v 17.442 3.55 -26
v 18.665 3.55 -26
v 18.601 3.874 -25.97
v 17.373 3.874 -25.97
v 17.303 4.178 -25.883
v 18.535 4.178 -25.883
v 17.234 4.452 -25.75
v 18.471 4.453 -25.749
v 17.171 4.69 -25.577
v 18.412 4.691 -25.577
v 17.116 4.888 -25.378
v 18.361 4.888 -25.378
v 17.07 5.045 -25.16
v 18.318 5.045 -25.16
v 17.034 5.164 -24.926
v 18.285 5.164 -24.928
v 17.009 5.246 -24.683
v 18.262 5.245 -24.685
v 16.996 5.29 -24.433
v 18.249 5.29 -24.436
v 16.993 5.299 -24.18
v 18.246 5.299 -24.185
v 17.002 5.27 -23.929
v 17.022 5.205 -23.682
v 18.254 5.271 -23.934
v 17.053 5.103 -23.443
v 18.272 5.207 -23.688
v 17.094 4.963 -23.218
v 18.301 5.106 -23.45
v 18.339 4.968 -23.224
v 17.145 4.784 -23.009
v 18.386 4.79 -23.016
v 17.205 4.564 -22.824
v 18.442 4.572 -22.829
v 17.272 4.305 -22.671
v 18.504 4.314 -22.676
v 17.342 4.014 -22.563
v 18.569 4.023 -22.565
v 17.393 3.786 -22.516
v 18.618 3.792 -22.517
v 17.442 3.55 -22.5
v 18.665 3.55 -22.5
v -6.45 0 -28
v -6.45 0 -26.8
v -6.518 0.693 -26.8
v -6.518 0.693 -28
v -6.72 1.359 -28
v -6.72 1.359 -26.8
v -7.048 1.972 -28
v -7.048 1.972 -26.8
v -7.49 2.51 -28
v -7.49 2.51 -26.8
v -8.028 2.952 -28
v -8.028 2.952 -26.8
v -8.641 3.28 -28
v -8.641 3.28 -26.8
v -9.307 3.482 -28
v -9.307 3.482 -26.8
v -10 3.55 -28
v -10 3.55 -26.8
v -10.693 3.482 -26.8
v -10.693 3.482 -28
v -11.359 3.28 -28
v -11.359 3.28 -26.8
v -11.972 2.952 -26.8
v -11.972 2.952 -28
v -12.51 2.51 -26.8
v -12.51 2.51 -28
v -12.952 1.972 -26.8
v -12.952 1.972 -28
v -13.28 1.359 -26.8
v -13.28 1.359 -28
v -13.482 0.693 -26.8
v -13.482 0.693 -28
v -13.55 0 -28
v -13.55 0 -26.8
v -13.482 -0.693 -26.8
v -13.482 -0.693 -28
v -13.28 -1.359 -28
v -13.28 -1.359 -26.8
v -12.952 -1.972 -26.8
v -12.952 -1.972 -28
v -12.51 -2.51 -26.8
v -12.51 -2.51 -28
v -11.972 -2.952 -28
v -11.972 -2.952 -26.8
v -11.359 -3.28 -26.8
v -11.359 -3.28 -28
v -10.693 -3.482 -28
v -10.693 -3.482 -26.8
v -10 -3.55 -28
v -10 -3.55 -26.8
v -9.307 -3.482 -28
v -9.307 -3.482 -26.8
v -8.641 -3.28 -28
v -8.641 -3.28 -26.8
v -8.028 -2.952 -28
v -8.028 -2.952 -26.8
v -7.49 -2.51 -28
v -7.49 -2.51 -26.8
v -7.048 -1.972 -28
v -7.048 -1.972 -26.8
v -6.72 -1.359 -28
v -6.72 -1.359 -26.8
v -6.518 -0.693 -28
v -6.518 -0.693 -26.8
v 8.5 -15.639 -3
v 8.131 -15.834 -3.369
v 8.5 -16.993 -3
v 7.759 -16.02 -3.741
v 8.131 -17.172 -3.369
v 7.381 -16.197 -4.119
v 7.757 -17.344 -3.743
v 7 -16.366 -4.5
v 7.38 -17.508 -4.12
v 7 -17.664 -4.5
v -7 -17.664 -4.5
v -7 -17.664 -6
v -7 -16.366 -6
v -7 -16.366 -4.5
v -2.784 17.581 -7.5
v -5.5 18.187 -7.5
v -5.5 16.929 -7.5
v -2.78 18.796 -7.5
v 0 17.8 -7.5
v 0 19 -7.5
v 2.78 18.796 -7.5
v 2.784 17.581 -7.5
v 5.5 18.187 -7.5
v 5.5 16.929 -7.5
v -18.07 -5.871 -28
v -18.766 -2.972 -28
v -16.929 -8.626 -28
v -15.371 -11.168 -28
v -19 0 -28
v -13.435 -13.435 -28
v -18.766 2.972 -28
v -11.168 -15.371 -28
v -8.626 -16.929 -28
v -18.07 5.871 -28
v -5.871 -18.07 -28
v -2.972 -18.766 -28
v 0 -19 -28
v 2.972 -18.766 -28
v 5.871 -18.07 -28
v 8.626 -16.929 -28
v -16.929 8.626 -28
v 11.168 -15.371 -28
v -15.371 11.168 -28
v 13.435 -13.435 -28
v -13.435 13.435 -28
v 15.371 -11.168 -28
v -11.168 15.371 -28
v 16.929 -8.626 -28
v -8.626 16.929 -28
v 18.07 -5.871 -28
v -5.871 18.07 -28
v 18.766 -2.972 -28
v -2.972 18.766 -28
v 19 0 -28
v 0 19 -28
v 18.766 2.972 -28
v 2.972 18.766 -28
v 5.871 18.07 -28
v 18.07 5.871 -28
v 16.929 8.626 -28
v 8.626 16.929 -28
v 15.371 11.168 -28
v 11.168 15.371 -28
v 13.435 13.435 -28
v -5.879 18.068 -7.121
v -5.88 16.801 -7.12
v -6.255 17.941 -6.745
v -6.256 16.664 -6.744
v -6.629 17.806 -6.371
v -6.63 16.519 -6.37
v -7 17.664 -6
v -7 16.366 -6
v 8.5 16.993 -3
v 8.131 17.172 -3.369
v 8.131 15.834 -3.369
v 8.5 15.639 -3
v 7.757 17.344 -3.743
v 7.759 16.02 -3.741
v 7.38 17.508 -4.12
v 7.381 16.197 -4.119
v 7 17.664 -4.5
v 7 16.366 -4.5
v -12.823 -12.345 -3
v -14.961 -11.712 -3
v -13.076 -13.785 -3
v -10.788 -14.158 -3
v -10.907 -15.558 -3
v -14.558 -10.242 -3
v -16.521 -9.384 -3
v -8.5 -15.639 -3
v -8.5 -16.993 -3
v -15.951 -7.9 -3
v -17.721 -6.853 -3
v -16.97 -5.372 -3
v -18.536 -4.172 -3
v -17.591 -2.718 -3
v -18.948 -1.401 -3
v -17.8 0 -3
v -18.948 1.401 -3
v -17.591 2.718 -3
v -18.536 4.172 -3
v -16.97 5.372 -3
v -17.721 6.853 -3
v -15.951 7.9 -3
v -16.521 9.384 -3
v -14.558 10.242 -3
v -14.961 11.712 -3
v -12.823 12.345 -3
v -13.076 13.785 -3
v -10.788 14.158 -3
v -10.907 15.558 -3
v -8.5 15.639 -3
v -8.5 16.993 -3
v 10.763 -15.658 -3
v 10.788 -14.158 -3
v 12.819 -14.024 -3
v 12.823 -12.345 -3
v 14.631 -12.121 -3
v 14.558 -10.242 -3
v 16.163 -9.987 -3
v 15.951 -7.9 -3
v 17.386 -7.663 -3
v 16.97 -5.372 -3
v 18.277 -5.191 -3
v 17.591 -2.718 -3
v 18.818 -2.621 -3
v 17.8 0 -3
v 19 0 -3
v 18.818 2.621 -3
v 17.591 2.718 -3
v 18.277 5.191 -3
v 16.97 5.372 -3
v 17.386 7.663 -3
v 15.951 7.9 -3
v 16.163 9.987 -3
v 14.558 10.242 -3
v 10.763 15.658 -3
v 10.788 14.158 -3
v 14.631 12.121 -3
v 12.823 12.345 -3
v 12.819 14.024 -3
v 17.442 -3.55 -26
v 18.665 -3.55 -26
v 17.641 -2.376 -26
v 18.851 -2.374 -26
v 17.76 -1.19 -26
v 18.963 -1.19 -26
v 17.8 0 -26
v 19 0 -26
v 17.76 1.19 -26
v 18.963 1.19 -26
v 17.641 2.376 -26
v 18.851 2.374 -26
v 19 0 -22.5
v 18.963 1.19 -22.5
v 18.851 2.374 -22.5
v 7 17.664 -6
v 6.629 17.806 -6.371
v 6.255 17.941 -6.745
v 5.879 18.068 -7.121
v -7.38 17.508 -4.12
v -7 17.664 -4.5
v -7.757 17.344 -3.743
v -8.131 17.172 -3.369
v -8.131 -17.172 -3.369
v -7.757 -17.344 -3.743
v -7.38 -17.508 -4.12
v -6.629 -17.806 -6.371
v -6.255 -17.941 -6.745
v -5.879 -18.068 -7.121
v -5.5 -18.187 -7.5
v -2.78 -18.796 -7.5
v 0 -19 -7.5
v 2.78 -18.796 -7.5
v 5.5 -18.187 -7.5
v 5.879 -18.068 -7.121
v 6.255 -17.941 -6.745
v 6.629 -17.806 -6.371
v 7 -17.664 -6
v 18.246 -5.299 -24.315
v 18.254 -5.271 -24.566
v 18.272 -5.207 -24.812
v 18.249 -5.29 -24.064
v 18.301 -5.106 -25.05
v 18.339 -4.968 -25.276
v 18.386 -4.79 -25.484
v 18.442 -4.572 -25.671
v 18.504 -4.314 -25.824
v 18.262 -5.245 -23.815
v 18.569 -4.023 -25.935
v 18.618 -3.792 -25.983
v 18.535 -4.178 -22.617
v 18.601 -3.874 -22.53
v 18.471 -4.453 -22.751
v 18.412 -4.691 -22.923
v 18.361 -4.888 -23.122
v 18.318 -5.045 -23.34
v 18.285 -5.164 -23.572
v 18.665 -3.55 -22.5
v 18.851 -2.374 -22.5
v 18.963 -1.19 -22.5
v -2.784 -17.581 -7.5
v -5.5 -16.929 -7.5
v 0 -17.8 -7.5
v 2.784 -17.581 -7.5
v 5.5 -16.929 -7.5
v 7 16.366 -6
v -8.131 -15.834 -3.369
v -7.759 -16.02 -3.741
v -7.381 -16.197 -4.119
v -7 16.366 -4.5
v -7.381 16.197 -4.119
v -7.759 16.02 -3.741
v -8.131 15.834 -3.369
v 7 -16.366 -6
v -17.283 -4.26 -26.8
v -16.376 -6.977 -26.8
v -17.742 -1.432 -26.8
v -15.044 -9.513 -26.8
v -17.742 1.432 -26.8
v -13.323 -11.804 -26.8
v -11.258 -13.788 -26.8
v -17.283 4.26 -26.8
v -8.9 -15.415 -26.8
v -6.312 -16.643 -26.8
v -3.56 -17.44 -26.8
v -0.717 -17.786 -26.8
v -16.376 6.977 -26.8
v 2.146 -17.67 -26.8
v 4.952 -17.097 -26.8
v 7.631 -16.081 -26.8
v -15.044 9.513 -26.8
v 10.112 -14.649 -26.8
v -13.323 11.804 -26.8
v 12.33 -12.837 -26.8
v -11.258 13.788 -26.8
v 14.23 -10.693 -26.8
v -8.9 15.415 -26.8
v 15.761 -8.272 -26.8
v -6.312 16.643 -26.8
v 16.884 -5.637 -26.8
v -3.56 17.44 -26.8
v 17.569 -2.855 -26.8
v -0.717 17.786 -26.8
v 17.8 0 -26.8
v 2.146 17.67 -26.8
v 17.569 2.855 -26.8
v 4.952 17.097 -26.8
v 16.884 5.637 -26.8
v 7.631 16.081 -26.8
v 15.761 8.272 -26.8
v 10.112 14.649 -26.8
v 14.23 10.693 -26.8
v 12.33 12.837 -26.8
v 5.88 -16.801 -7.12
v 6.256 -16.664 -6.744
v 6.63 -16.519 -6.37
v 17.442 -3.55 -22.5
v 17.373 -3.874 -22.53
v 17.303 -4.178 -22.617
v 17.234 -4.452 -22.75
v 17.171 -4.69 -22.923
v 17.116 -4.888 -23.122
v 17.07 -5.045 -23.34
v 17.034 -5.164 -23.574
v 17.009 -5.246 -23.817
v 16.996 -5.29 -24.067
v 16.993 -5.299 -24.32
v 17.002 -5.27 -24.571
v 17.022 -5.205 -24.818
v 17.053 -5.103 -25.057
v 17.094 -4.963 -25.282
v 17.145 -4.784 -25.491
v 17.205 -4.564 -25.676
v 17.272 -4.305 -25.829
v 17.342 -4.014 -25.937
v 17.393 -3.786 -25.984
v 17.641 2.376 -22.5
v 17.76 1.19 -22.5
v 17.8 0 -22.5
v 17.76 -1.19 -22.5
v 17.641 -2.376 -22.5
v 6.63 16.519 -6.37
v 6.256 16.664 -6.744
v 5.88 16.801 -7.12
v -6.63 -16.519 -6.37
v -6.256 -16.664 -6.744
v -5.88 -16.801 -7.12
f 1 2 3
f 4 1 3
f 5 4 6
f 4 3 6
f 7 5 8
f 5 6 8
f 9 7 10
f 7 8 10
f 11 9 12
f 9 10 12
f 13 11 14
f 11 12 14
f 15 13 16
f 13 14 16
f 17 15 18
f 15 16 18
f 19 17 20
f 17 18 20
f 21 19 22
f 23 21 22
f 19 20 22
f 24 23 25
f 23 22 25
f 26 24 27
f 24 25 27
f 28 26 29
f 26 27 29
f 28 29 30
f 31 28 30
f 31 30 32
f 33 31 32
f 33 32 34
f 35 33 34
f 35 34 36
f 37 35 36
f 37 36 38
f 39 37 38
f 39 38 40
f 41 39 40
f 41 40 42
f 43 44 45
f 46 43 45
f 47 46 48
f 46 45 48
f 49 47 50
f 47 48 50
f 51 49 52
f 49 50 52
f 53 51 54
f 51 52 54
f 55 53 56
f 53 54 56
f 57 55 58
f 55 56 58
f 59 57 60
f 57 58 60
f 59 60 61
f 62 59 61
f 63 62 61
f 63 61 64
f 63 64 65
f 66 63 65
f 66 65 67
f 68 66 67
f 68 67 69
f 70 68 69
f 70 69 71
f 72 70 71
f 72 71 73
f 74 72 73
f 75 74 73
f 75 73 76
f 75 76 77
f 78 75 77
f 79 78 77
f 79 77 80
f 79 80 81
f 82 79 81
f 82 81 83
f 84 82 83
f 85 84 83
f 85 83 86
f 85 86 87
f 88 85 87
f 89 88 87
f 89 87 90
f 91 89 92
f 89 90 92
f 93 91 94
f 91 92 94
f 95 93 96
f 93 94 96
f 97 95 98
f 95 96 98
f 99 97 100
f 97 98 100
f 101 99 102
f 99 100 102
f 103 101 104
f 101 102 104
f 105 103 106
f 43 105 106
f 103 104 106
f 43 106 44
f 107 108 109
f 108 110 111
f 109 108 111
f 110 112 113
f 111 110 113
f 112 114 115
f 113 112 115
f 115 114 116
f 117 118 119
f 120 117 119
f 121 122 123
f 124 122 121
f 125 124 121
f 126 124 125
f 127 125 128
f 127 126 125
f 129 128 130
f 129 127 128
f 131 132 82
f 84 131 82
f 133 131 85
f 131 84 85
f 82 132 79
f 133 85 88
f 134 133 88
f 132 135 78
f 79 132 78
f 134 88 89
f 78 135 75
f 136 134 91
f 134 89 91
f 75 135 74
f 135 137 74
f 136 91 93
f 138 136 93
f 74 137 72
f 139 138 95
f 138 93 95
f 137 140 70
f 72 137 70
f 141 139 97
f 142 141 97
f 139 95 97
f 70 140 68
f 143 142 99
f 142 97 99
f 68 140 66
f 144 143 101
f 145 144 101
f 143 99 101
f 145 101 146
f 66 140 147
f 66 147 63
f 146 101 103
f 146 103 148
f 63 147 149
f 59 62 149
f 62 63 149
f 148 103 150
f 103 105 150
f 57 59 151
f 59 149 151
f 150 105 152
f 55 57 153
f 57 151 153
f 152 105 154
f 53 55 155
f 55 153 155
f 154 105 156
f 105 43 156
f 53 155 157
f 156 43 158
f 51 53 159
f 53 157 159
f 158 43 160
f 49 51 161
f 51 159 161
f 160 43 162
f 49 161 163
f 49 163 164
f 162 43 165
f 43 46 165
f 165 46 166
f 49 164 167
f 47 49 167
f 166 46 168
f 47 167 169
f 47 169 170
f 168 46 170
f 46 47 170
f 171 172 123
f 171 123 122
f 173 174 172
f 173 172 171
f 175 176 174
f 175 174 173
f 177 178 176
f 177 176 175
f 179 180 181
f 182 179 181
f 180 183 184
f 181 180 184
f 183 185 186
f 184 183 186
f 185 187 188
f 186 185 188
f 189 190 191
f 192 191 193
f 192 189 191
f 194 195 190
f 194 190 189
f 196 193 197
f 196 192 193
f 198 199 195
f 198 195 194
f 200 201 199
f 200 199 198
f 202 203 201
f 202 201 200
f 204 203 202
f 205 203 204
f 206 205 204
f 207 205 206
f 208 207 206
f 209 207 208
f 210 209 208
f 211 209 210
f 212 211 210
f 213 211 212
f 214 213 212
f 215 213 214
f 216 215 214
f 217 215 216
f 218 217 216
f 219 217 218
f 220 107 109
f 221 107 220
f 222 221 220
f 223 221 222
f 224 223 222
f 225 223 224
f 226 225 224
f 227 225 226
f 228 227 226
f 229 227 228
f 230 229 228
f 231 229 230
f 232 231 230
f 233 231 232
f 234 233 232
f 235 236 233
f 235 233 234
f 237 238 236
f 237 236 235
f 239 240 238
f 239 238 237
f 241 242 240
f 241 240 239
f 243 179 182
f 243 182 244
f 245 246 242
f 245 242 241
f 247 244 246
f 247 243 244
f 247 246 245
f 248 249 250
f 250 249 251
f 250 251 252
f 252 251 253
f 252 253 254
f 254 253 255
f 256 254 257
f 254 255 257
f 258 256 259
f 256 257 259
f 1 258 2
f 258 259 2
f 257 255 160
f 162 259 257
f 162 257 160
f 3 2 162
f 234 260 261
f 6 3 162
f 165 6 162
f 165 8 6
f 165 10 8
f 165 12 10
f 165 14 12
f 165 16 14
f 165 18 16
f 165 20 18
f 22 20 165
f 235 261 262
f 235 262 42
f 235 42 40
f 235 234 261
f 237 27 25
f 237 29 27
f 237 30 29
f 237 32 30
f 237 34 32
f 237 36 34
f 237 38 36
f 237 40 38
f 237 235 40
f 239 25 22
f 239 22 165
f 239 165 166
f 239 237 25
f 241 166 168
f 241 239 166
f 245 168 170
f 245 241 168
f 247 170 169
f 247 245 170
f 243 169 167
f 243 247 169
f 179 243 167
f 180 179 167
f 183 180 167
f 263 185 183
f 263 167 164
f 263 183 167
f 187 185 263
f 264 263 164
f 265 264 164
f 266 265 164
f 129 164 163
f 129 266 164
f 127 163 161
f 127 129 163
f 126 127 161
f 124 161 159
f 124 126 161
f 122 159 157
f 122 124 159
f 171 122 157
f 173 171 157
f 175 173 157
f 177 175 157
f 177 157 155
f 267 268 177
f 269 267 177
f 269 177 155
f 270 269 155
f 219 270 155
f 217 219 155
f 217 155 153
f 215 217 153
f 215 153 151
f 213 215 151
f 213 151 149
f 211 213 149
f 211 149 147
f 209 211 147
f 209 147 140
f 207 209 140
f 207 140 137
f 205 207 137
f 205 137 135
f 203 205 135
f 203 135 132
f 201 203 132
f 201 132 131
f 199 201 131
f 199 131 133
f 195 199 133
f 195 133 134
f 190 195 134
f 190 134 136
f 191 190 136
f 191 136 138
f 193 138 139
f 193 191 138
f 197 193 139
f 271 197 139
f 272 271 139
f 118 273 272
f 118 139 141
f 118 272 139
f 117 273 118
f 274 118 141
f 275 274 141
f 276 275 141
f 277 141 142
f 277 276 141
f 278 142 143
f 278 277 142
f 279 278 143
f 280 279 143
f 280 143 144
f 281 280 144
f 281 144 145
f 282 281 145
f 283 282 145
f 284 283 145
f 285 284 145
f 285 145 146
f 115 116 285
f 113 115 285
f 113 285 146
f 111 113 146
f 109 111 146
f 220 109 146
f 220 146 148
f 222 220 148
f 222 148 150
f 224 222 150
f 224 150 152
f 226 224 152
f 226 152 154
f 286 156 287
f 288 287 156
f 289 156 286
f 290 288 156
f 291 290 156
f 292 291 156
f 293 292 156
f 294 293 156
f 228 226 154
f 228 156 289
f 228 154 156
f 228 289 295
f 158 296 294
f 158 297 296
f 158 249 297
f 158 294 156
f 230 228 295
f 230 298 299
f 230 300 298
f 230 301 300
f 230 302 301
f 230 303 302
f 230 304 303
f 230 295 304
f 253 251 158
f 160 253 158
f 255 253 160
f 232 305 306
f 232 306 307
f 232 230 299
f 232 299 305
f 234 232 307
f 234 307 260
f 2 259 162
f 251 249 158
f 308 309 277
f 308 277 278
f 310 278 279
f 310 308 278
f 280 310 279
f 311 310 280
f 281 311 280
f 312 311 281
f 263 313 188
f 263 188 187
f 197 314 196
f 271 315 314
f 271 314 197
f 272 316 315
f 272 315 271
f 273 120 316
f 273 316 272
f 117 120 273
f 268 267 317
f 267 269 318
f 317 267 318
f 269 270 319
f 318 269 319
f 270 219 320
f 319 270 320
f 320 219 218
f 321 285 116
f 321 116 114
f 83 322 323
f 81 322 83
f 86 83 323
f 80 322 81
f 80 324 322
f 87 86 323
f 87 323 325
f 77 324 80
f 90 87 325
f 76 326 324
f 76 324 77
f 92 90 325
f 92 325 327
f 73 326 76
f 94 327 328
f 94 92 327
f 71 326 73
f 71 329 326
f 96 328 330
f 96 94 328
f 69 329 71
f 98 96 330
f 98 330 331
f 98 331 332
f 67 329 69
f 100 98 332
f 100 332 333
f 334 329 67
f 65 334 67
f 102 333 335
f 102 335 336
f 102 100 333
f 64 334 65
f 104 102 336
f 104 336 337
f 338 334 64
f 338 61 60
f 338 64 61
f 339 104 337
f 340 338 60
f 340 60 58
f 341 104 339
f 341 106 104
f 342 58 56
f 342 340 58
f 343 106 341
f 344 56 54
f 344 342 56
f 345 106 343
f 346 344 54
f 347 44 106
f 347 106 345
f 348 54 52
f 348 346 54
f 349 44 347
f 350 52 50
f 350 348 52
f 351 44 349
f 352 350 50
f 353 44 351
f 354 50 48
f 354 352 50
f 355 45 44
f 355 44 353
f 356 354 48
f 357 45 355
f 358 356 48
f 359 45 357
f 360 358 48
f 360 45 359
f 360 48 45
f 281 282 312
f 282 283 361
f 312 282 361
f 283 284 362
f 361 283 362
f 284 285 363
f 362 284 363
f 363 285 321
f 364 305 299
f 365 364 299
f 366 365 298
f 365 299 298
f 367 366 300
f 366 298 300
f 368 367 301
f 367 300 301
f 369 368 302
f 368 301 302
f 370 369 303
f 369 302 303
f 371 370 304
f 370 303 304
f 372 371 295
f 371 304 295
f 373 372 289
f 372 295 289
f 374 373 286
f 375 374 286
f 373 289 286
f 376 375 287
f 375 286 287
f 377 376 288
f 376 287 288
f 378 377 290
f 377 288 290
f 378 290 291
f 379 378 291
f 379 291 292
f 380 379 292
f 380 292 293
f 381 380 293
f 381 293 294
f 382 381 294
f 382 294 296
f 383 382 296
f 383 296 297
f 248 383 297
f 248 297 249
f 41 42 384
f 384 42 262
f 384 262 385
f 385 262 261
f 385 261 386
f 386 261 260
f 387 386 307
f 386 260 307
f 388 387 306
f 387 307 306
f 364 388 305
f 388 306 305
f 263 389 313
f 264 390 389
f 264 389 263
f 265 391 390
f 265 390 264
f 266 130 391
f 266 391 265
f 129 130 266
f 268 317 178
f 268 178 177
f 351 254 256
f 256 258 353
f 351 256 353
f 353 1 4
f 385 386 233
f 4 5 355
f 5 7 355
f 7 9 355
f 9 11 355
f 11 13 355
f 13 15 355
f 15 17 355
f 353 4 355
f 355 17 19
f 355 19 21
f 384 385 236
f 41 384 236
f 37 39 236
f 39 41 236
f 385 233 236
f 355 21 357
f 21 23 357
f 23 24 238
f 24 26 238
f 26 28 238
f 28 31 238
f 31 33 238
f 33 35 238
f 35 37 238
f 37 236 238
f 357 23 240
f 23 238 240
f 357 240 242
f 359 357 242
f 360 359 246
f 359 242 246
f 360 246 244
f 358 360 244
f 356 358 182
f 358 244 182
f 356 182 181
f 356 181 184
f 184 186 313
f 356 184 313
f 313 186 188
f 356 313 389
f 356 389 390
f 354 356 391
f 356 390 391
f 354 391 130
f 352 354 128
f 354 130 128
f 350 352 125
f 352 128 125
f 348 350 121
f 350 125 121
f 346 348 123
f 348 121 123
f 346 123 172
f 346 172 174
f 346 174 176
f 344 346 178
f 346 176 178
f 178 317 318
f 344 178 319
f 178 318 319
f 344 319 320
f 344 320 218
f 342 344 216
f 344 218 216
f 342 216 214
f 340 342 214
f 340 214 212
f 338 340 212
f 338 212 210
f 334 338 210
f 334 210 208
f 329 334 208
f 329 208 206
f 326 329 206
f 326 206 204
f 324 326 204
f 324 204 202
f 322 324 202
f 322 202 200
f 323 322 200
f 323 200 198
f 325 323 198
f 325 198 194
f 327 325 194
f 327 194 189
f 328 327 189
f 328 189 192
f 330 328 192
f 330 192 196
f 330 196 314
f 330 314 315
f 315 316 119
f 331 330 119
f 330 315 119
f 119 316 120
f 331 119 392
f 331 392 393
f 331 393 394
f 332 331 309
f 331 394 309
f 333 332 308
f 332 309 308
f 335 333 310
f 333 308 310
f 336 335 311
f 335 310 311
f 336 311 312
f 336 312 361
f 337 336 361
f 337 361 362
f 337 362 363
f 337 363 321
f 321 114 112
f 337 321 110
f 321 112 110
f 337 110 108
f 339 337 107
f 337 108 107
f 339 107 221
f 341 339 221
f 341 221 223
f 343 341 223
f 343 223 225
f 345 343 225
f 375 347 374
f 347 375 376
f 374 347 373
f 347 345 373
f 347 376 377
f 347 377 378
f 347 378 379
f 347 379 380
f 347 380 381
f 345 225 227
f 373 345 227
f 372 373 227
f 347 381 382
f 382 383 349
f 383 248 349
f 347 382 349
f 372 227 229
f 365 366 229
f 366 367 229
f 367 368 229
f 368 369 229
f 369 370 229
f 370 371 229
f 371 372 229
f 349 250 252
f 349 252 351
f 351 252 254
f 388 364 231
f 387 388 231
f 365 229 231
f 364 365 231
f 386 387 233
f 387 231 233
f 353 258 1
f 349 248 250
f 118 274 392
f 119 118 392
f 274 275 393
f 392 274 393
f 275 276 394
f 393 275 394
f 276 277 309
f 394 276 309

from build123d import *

# Parameters (mm, degrees)
SKETCH010_R     = 19
PAD007_DEPTH    = 25
THICKNESS001_T  = -1.2
BOX001_W        = 14
BOX001_H        = 50
BOX001_DEPTH    = 10
CHAMFER002_SIZE = 1.5
SKETCH012_R     = 3.55
POCKET_DEPTH    = 23
POCKET002_DEPTH = 27


with BuildPart() as part:
    # Sketch010 → Pad007 (new body)
    with BuildSketch(Plane.XY):
        Circle(SKETCH010_R)
    extrude(amount=-PAD007_DEPTH)

    # Thickness001
    thickness001_openings = [part.faces().sort_by_distance(p)[0] for p in [
        (0, 0, 0),
    ]]
    offset(amount=THICKNESS001_T, openings=thickness001_openings)

    # Box001 → Box001 (cut)
    with BuildSketch(Plane(origin=(-7, -24, -4.5), x_dir=(1, 0, 0), z_dir=(0, 0, 1))):
        with Locations((7, 25)):
            Rectangle(BOX001_W, BOX001_H)
    extrude(amount=BOX001_DEPTH, mode=Mode.SUBTRACT)

    # Chamfer002
    chamfer002_edges = [part.edges().sort_by_distance(p)[0] for p in [
        (7, 17.01467, -4.5),
        (7, 17.01467, 0),
        (7, -17.01467, -4.5),
        (7, -17.01467, 0),
        (-7, -17.01467, -4.5),
        (-7, -17.01467, 0),
        (-7, 17.01467, -4.5),
        (-7, 17.01467, 0),
    ]]
    chamfer(chamfer002_edges, length=CHAMFER002_SIZE)

    # Sketch012 → Pocket (cut)
    with BuildSketch(Plane.XY.offset(-4)):
        with Locations((-10, 0)):
            Circle(SKETCH012_R)
    extrude(amount=-POCKET_DEPTH, mode=Mode.SUBTRACT)

    # Sketch013 → Pocket002 (cut)
    with BuildSketch(Plane.YZ.offset(20)):
        with BuildLine():
            ThreePointArc((-3.55, -19.5), (-5.3, -21.25), (-3.55, -23))
            Line((-3.55, -23), (3.55, -23))
            ThreePointArc((3.55, -23), (5.3, -21.25), (3.55, -19.5))
            Line((3.55, -19.5), (-3.55, -19.5))
        make_face()
    extrude(amount=-POCKET002_DEPTH, mode=Mode.SUBTRACT)


with BuildPart() as part_1:
    # Body006 placement: moved
    add(part.part.moved(Location((0, 0, -3))))


solid = part_1.part
